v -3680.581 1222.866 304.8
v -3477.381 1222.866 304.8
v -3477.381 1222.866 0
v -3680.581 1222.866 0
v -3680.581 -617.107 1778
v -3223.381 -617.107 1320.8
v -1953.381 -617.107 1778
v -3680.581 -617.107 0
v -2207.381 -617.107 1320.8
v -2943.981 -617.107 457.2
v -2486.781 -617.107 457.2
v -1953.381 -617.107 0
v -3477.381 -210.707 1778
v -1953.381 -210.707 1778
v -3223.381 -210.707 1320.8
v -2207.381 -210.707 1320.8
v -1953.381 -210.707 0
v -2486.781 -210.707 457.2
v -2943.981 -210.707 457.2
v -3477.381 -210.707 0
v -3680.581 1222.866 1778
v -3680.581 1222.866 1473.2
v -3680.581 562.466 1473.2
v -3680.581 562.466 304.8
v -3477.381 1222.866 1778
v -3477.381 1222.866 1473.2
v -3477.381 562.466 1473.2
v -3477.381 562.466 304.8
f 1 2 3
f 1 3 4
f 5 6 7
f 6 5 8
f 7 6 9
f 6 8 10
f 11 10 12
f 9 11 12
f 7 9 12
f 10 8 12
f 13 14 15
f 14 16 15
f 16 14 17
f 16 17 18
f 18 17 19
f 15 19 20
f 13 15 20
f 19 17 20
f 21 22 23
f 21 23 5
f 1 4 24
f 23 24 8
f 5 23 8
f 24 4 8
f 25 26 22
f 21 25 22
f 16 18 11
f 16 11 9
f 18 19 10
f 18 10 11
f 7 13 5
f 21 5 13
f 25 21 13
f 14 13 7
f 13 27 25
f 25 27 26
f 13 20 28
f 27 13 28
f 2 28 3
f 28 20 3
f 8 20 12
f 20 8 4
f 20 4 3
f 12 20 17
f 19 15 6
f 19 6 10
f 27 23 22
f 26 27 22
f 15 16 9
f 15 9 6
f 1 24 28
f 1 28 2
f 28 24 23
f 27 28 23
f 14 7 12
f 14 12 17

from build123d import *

# Parameters (mm, degrees)
Y_KSEKLIK_EKSTR_ZYON1_DEPTH = 1778
IZIM3_W                     = 1168.4
IZIM3_H                     = 660.4
KES_EKSTR_ZYON1_DEPTH       = 203.2
KES_EKSTR_ZYON2_DEPTH       = 406.4


with BuildPart() as part:
    # Çizim1 → Yükseklik-Ekstrüzyon1 (new body)
    with BuildSketch(Plane.XY):
        Polygon((-3680.580952381, 1222.865979381), (-3680.580952381, -617.10652921), (-1953.380952381, -617.10652921), (-1953.380952381, -210.70652921), (-3477.380952381, -210.70652921), (-3477.380952381, 1222.865979381), align=None)
    extrude(amount=Y_KSEKLIK_EKSTR_ZYON1_DEPTH)

    # Çizim3 → Kes-Ekstrüzyon1 (cut)
    with BuildSketch(Plane.ZY.offset(3680.580952381)):
        with Locations((889, 892.665979381)):
            Rectangle(IZIM3_W, IZIM3_H)
    extrude(amount=-KES_EKSTR_ZYON1_DEPTH, mode=Mode.SUBTRACT)

    # Çizim4 → Kes-Ekstrüzyon2 (cut)
    with BuildSketch(Plane(origin=(0, -210.70652921, 0), x_dir=(1, 0, 0), z_dir=(0, 1, 0))):
        Polygon((-2943.980952381, -457.2), (-2486.780952381, -457.2), (-2207.380952381, -1320.8), (-3223.380952381, -1320.8), align=None)
    extrude(amount=-KES_EKSTR_ZYON2_DEPTH, mode=Mode.SUBTRACT)


solid = part.part
